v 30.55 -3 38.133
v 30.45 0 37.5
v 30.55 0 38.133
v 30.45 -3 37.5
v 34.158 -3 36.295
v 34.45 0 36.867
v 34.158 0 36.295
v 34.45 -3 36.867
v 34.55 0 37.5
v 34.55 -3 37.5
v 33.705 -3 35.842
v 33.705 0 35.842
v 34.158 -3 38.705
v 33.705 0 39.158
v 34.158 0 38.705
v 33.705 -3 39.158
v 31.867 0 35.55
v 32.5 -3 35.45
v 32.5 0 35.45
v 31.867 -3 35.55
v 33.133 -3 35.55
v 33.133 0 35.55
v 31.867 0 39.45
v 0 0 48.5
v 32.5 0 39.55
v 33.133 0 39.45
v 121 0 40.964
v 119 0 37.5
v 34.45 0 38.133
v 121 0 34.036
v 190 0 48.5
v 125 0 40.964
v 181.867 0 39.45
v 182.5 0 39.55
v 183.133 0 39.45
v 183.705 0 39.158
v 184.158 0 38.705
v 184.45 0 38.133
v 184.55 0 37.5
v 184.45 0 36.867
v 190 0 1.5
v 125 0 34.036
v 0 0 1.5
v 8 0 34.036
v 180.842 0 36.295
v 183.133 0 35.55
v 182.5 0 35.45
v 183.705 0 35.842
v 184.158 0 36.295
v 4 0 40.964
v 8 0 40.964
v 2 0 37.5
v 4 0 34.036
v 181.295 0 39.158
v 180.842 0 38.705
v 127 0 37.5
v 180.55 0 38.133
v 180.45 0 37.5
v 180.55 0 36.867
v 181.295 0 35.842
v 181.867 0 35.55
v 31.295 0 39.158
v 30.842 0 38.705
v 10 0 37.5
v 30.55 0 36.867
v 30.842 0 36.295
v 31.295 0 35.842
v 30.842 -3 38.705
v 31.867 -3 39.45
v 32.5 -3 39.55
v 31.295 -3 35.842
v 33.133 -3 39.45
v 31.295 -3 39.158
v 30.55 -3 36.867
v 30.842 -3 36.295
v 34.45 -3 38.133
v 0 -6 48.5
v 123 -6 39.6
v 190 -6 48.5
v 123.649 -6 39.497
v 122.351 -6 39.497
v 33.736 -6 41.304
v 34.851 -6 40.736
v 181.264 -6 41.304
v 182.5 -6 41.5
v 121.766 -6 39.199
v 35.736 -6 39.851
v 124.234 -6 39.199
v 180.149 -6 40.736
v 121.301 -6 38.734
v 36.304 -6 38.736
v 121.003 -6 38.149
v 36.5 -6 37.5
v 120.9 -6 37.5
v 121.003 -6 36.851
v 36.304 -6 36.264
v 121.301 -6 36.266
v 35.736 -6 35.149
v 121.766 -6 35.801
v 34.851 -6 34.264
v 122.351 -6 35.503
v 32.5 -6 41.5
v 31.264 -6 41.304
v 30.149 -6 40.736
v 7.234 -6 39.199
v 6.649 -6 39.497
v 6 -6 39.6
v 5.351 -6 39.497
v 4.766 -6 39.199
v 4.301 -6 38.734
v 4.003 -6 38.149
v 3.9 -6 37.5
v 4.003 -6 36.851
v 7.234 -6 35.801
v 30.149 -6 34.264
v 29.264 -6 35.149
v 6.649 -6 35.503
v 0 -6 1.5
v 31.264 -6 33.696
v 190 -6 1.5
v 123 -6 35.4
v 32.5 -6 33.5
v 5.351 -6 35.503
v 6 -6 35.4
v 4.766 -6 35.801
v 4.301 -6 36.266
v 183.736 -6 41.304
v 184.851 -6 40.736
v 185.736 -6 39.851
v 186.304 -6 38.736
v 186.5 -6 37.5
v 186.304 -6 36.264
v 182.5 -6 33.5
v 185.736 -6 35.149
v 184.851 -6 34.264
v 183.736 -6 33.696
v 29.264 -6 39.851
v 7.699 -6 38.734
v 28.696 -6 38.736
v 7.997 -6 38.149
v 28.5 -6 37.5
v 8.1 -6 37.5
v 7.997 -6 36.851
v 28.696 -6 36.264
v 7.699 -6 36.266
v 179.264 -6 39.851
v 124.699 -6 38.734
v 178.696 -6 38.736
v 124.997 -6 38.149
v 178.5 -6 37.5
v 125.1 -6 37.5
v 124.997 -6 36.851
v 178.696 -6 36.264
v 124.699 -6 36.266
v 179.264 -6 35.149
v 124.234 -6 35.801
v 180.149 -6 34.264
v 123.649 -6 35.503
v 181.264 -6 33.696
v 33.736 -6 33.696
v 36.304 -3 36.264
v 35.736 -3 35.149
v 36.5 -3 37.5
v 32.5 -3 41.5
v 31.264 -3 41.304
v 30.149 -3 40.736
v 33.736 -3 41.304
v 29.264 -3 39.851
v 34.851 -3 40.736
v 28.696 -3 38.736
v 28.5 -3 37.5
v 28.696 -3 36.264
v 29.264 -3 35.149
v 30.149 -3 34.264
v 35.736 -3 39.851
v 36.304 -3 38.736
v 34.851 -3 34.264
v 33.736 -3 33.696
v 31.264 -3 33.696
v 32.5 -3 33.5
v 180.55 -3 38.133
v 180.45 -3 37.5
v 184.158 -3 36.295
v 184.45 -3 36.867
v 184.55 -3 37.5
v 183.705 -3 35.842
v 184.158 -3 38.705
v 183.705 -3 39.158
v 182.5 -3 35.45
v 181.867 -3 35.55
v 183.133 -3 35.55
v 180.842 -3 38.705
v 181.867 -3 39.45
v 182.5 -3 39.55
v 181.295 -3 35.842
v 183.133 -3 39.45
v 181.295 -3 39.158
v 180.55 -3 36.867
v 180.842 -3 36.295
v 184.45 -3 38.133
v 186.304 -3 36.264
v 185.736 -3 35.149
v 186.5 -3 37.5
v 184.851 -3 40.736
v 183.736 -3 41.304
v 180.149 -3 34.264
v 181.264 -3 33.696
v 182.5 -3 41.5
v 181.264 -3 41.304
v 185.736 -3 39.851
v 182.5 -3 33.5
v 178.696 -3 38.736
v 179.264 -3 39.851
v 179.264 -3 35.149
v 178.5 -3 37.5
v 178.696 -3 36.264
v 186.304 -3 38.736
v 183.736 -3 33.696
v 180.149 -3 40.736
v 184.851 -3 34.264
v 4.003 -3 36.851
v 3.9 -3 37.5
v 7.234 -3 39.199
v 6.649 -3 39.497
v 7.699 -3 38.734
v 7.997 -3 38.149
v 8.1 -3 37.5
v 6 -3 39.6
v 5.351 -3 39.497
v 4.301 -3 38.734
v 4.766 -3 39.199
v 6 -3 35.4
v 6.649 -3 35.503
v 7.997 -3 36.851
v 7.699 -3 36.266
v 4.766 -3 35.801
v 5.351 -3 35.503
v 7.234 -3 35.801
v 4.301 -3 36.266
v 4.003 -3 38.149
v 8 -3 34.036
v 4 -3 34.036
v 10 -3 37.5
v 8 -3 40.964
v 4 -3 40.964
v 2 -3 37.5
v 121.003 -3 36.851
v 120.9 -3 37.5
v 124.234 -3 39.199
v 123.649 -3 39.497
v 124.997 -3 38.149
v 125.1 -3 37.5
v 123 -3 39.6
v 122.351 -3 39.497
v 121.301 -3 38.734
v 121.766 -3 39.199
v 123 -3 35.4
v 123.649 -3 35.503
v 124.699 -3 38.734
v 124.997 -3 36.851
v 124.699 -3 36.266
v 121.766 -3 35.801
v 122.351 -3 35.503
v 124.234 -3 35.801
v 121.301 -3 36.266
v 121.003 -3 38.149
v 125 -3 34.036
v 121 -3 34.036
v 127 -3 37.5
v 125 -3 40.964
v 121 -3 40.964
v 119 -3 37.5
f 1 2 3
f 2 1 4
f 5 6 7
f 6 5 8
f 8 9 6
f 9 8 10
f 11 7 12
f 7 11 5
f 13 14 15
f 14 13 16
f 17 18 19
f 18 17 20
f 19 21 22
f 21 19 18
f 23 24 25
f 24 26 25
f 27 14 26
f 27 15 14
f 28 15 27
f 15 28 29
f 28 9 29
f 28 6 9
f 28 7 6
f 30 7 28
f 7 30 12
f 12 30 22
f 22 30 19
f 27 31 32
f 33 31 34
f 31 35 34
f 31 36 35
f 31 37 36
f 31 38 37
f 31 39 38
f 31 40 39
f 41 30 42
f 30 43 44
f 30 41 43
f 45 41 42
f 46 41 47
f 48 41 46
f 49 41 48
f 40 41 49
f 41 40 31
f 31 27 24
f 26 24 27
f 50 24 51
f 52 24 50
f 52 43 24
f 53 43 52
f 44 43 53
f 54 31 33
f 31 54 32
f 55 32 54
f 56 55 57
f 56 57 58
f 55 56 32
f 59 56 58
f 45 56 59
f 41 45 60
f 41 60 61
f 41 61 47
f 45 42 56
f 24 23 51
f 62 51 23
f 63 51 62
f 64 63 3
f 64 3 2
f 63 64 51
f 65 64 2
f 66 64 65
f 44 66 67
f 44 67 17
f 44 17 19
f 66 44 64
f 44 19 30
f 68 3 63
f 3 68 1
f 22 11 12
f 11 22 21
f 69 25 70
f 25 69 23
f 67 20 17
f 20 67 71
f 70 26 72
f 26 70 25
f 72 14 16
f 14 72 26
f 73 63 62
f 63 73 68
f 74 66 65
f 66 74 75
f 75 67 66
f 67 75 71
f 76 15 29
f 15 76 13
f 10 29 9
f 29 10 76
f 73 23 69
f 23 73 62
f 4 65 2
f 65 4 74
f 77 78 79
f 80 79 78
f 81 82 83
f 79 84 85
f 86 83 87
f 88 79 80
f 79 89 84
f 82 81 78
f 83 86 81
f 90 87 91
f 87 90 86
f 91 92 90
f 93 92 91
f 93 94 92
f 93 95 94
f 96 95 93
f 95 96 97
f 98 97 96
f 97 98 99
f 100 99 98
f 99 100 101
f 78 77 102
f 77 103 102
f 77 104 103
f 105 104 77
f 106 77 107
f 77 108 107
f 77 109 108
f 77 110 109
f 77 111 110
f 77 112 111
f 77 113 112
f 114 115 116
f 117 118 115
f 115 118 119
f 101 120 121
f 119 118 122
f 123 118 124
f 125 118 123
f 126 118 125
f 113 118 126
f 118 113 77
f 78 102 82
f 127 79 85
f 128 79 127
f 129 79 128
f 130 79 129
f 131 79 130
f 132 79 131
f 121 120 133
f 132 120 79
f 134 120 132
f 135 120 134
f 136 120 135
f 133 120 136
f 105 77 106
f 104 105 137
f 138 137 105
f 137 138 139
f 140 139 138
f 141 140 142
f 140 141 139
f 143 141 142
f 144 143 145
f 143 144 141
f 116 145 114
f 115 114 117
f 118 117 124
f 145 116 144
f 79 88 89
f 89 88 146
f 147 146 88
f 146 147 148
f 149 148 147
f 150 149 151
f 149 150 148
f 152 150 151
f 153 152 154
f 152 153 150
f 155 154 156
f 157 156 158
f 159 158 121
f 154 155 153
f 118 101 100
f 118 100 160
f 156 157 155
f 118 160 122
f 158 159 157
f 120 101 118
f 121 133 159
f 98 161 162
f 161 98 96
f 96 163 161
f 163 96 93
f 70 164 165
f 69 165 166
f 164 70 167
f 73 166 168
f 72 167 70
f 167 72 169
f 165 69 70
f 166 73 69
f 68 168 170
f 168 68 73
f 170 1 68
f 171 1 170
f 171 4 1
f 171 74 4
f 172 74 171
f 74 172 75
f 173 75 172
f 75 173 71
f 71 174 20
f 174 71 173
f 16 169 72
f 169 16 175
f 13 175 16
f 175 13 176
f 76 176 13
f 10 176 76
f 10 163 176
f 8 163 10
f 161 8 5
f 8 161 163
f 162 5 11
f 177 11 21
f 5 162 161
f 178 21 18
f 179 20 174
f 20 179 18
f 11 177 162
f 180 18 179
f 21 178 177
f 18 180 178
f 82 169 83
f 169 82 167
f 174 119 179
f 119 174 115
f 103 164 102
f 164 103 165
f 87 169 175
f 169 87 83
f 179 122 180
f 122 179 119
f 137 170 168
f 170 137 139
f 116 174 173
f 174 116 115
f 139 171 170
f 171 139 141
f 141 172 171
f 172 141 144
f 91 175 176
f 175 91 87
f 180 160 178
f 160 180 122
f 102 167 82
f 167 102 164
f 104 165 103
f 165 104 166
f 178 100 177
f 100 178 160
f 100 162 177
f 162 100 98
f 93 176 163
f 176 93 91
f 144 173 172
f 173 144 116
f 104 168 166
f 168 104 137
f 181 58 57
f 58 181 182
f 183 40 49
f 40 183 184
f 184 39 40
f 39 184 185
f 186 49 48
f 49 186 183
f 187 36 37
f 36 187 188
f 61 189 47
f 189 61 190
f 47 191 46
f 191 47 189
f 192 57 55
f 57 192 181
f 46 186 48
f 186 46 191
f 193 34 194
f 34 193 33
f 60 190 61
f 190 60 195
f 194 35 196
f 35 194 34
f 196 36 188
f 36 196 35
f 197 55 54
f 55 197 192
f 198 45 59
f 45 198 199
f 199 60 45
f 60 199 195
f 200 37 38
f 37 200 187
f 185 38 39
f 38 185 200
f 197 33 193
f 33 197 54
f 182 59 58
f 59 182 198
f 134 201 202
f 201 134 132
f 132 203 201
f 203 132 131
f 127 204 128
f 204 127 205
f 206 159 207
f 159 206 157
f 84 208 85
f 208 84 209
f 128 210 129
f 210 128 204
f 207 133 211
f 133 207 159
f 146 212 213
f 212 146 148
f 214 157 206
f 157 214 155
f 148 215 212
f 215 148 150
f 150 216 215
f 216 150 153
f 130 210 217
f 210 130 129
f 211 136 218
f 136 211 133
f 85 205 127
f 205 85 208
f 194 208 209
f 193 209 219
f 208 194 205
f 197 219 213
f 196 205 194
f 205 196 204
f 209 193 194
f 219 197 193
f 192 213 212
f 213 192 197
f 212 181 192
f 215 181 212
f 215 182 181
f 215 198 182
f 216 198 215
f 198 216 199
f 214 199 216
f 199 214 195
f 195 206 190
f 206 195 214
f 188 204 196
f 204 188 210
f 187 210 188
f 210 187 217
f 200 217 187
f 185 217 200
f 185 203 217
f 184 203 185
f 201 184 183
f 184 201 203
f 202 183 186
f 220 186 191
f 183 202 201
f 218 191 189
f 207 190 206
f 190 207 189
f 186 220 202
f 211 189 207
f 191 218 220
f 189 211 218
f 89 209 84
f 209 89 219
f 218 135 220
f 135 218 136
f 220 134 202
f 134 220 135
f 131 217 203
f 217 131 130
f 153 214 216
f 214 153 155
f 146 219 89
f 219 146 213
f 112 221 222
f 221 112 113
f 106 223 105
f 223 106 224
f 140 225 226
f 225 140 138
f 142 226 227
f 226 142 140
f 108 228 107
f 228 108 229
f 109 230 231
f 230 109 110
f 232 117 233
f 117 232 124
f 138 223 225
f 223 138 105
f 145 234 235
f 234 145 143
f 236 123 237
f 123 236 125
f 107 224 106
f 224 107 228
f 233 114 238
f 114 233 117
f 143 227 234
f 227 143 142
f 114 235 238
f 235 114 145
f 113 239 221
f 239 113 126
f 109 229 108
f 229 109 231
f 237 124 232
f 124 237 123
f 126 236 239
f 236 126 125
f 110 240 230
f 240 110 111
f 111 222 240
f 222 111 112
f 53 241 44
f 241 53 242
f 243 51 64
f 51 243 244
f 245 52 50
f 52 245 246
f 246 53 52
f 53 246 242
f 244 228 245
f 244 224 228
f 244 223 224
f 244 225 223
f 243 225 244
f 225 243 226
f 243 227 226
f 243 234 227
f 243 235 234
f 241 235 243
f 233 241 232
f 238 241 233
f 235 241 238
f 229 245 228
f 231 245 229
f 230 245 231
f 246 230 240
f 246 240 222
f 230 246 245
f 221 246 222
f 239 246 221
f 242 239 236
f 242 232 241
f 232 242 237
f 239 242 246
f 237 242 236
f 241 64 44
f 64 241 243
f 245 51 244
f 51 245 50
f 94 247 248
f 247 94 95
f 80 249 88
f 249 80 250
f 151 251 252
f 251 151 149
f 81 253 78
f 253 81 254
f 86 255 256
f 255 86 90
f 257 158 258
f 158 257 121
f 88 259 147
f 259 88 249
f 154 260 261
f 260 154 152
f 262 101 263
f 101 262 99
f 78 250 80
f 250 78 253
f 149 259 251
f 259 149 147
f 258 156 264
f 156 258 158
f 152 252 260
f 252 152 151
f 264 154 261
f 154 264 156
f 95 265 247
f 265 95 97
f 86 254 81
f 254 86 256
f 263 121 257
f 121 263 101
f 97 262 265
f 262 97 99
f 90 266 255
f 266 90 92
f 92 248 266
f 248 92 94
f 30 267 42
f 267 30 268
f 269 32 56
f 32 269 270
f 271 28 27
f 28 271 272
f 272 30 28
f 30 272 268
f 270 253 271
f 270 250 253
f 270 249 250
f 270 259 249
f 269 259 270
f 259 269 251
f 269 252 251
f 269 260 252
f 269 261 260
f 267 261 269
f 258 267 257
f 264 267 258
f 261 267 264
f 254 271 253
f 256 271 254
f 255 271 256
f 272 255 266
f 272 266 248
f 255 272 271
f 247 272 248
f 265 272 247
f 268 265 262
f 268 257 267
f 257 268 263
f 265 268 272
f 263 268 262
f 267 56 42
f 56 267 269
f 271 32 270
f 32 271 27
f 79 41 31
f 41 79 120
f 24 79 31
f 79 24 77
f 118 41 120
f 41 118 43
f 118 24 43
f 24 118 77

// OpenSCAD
// select to create the psu_base or the bottom plate

//create_base = true;
//create_bottom_plate = false;
//create_shim = false;

//create_base = false;
//create_bottom_plate = true;
//create_shim = false;

create_base = false;
create_bottom_plate = false;
create_shim = true;



// todo:
//   - fix outer wall sizes (done)
//   - add base plate (done)

//   - add psu attach holes (done)
//   - add buttresses (done)
//   - add inside ledge (done)
//
//   - add rail attach
//   - bevel corners
//   - bolt_reinforcements

//   - add base plate attach tabs
//   - add base plate attach holes

// curve fineness
$fn = 20;

//**********
// orientation reference:
//   bottom: side of PSU towards table (-x)
//   frameside: side of PSU towards mk3 frame (-y)
//   back: side of PSU away from frame (+y)
//   inside: side of PSU towards rails and Einsy (+z)
//   outside: side of PSU with switch/plug

//  The origin is defined as the bottom/outside/frameside corner of the PSU body
//    +X is up (away from the table with PSU mounted on mk3)
//    +Y is back (away from the frame)
//    +Z is inside (towards the Einsy)

// measured constants are all in mm units


//**********
// meanwell NES-350-24 measurements
psu_length = 215;
psu_width = 115;
psu_height = 50;

// inside face 4mm tapped holes, 32.5 from bottom and frame/back corner
psu_inside_hole_vertical = 32.5;
psu_inside_hole_edge     = 32.5;

// frame face 4mm tapped holes, 2 near inside corner
psu_frame_hole_edge = 12.5;
psu_frame_hole1_x = 32.5;
psu_frame_hole2_x = 182.5;

// back face 4mm tapped holes, 4
psu_back_hole_edge = 12.5;
psu_back_hole1_x = 32.5;
psu_back_hole2_x = 182.5;


// prusa y hole positions.  x relative to top of rail, z relative to center of rail
y_hole1_x = 56;
y_hole2_x = y_hole1_x + 117;

y_hole_z = psu_height - 12.5;


// bottom_plate

bp_edge_t = 2;

ra_width = 33;
ra_depth = 17;
ra_f_chamfer = 5;
ra_r_chamfer = 3;
ra_t = bp_edge_t + 3;

//**********
// desired hole size for through 3mm bolt (not tapped)
hole_3mm_bolt = 3.1;
hole_3mm_bolt_r = hole_3mm_bolt/2;

// desired hole size for through 3mm bolt (tapped)
hole_3mm_bolt_tapped = 3;
hole_3mm_bolt_tapped_r = hole_3mm_bolt_tapped/2;

// desired hole size for through 4mm bolt (not tapped)
hole_4mm_bolt = 4.1;
hole_4mm_bolt_r = hole_4mm_bolt/2;





// general size of base
base_psu_overlap = 50;
base_height = 100;

side_wall_t   = 2.5;
back_wall_t   = 4;
frame_wall_t  = 6;

// buttress
buttress_t = 3;
buttress_w = 14;
buttress_h = base_height;

buttress_top_chamfer = 5;
buttress_bottom_chamfer = bp_edge_t;


//********************
// measured from Prusa PSU base
//********************

//**********
// wire exit (two half circles connected by rectangle, for wires to Einsy)
//   diameter of end circles
wire_exit_d = 6.5;
//   distance between centers of end circles
wire_exit_width = 10;
//   distance from the frame side of the PSU to the center of the opening
//wire_exit_front_offset = 20;  //prusa version is 20, shifting forward to avoid buttress conflict
wire_exit_front_offset = 17;

//**********
// slot for mains supply plug, flush to bottom of 
//   width/height
plug_slot_width = 27.25;
plug_slot_height = 32;
//   distance back edge of slot to back
plug_slot_back_offset = 20;

//   bottom plate thickness (offset of bottom of assembly to slot)
plug_slot_bottom_offset = bp_edge_t;

//   distance from edge of slot to center of bolt holes
plug_screw_offset_h = 5;
//   distance from bottom of base to bolt holes
plug_screw_offset_v = 16.5;

//**********
// rectangular hole for power switch

//   height/width
switch_height = 20;
switch_width = 12.5;

//   distance from frame side of base to edge of hole
switch_frame_offset = 8.5;
//   distance from bottom of base to edge of hole
switch_bottom_offset = 3 + bp_edge_t;

//**********
//**********

// outside/frame/bottom corner of whole base assembly (including bottom plate)

base_outer_position = [   -(base_height - base_psu_overlap),
                          -frame_wall_t,
                          -side_wall_t ];

base_outer_size =     [ base_height,
                        psu_width + frame_wall_t + back_wall_t,
                        psu_height + 2*side_wall_t ];

switch_hole_size     = [switch_height,switch_width, side_wall_t];
switch_hole_position = base_outer_position + 
                       [  switch_bottom_offset,
                          switch_frame_offset,
                          0 ];

plug_slot_size     = [plug_slot_height, plug_slot_width, side_wall_t];
plug_slot_position = base_outer_position + 
                     [  plug_slot_bottom_offset,
                        base_outer_size[1]-plug_slot_back_offset-plug_slot_width,
                        0  ];




wire_exit_center = base_outer_position + 
                   [  wire_exit_d/2 + bp_edge_t,
                      wire_exit_front_offset+wire_exit_width/2,
                      base_outer_size[2]-side_wall_t/2  ];

ledge_width = 3;  
ledge_height = 8;



// slot for frame side shim

shim_base_depth = 50;
shim_base_edge  = 4;

shim_width = base_outer_size[2] - 2*shim_base_edge;
shim_thickness = 6;
shim_height = 190;





//**************
//* draw base

if(create_base && create_bottom_plate && create_shim){
  psu_base(create_base, create_bottom_plate);

  shim();

} else if (create_base) {
  difference(){
    psu_base(create_base, create_bottom_plate);
    base_plate_container();
  }
} else if (create_bottom_plate) {
  intersection(){
    psu_base(create_base, create_bottom_plate);
    base_plate_container();
  }
} else {

  shim();


}


//*****************
//* module
//*****************


// main(){

module psu_base(base, bottom_plate){

  // build the outer shell, then knock all the holes in it
  difference(){

    union(){
      // main shell
      outer_shell();
      buttresses();
      plug_hole_reinforce();
      psu_ledge();
      rail_attach();

      back_bump();  // thicker space to slide above back frame

      base_plate_tabs();

    }


    base_plate_tabs(holes = true);

    frame_side_opening();
    plug_hole();
    switch_hole();
    wire_exit();
    bottom_plate_screws();
    psu_base_screws();
    back_lift();  // thicker space to slide above back frame
  }


}




module psu_block(){
    cube([psu_length, psu_width, psu_height]);
}

module outer_shell(){
    difference()
    {
      translate(base_outer_position) cube(base_outer_size);
      // cut out a psu_block width/height hole
      psu_block();
      wire_space();
    }
}

module buttresses(){
  // inside edge, thicker portions around/under inside PSU attach screws
  // full height of base (including bottom plate)
  // chamfered at top/bottom

  //**
  // base positions for buttresses
  position1 = base_outer_position + [base_height/2,psu_inside_hole_edge+frame_wall_t,base_outer_size[2] + buttress_t/2];
  position2 = base_outer_position + [base_height/2,base_outer_size[1] - psu_inside_hole_edge-back_wall_t,base_outer_size[2] + buttress_t/2];

  //**
  // top chamfer (5mm)
   
  // triangle origin, top of buttress where it meets the base wall
  pt1 = [0,0]; 
  pt2 = [pt1[1], pt1[0] + buttress_t];
  pt3 = [pt1[1] - buttress_top_chamfer, pt1[0] + buttress_t];
  top_chamfer_pos = base_outer_position + base_outer_size;

  //**
  // bottom chamfer
  // triangle origin, top of buttress where it meets the base wall
  pt4 = [0,0]; 
  pt5 = [pt1[1], pt1[0] + buttress_t];
  pt6 = [pt1[1] + buttress_bottom_chamfer, pt1[0] + buttress_t];
  bottom_chamfer_pos = base_outer_position + [0,base_outer_size[1],base_outer_size[2]];

  


  difference(){
    union(){ 
      translate(position1) cube([buttress_h,buttress_w,buttress_t], center = true);
      translate(position2) cube([buttress_h,buttress_w,buttress_t], center = true);
    }
  
    translate(top_chamfer_pos)     rotate([90,0,0]) linear_extrude(height = base_outer_size[1]) polygon(points = [pt1,pt2,pt3]);
    translate(bottom_chamfer_pos)  rotate([90,0,0]) linear_extrude(height = base_outer_size[1]) polygon(points = [pt4,pt5,pt6]);
  }
}

module psu_ledge(){
  // 5mm ledge for PSU to rest on in base
  // full width of back wall
  // short segment on inside/outside wall

  chamfer_height = 8;

  short_ledge_extent = 20;
  short_ledge_frame_offset = 25;

  ledge_pts = [[0,0], 
               [ledge_height,0], 
               [ledge_height,ledge_width], 
               [-chamfer_height,ledge_width]];
  
  ledge1_pos = [-ledge_height,psu_width - ledge_width,0];
  translate(ledge1_pos) linear_extrude(height = psu_height) polygon(points = ledge_pts);

  ledge2_pos = [-ledge_height,short_ledge_frame_offset,ledge_width];
  translate(ledge2_pos) rotate([-90,0,0]) linear_extrude(height = short_ledge_extent) polygon(points = ledge_pts);  

  ledge3_pos = [-ledge_height,short_ledge_frame_offset + short_ledge_extent,psu_height - ledge_width];
  translate(ledge3_pos) rotate([90,0,0]) linear_extrude(height = short_ledge_extent) polygon(points = ledge_pts);  

}

module rail_attach(){

  sp_bot_flat = 2;
  sp_top_flat = 4.5;
  sp_height = 17 + bp_edge_t;
  sp_t = 5;
 
  hole_spacing = 20;
  hole_d = 3.2;
  hole_l = 6;
  hole_base_distance = 10;

  //** base
  base_poly = [ [0, 0],
                [0, ra_depth - ra_f_chamfer],
                [ra_f_chamfer, ra_depth],
                [ra_width - ra_r_chamfer, ra_depth],
                [ra_width, ra_depth-ra_r_chamfer],
                [ra_width, 0]];

  ra_pos = [base_outer_position[0],
            base_outer_position[1] + base_outer_size[1] - back_wall_t - psu_inside_hole_edge - ra_width/2 - buttress_w/2 - sp_t/2,
            base_outer_position[2] + base_outer_size[2]];


  //** angle support
  support_poly = [ [0,                  0],
		   [0,                  -ra_depth],
		   [sp_bot_flat + ra_t, -ra_depth],
		   [sp_height,          -sp_top_flat],
		   [sp_height,          0]];

//  sp_pos = [base_outer_position[0],
//            base_outer_position[1] + base_outer_size[1] - back_wall_t - psu_inside_hole_edge + buttress_w/2,
//            base_outer_position[2] + base_outer_size[2]];

  sp_pos = ra_pos + [0,ra_width/2 - sp_t/2,0 ];

  // holes

  h_pos1 = ra_pos + [ra_t/2,ra_width/2+hole_spacing/2,hole_base_distance];
  h_pos2 = ra_pos + [ra_t/2,ra_width/2-hole_spacing/2,hole_base_distance];


  difference(){
    union() {
      translate(ra_pos) rotate([90,0,90]) linear_extrude(height=ra_t) polygon(points = base_poly);
      translate(sp_pos) rotate([-90,0,0]) linear_extrude(height=sp_t) polygon(points = support_poly);
    }
    translate(h_pos1) rotate([0,90,0]) ra_slot(hole_d/2, 2.5, ra_t);
    translate(h_pos2) rotate([0,90,0]) ra_slot(hole_d/2, 2.5, ra_t);
  }
}

module ra_slot(radius, circle_d, depth){
  translate([circle_d/2,0,0])  cylinder(h = depth*1.1, r=radius, center = true);
  translate([-circle_d/2,0,0]) cylinder(h = depth*1.1, r=radius, center = true);
  translate([0,0,0]) cube([circle_d, 2*radius, depth*1.1], center = true);
}


module back_bump(){
  // solid lip in back of base, lid won't go there
  //  provides 2mm clearance for rear frame piece of i3

  bump_y = ledge_width + back_wall_t;
  bump_x = 25;
  bump_z = base_outer_size[2];

  bump_pos = [base_outer_position[0],
              base_outer_position[1] + base_outer_size[1] - bump_y, 
              base_outer_position[2] + base_outer_size[2] - bump_z];

  translate(bump_pos) cube([bump_x,bump_y,bump_z]);
}

module back_lift(){
  // gap in bottom of back for frame

  lift_x = bp_edge_t;
  lift_y = ledge_width + back_wall_t - 1.2;
  lift_z = base_outer_size[2];

  lift_pos = [base_outer_position[0],
              base_outer_position[1] + base_outer_size[1] - lift_y, 
              base_outer_position[2] + base_outer_size[2] - lift_z];

  translate(lift_pos) cube([lift_x,lift_y,lift_z]);
}


module wire_space(){
    translate(base_outer_position + [bp_edge_t,frame_wall_t, side_wall_t])
      cube( [ base_height - base_psu_overlap - bp_edge_t, 
              base_outer_size[1] - frame_wall_t - back_wall_t,
              base_outer_size[2] - 2*side_wall_t]);
}

module plug_hole(){

  translate(plug_slot_position) cube(plug_slot_size);

  // screw positions relative to plug slot position
  screw1_position = [plug_screw_offset_v,-plug_screw_offset_h,0];
  screw2_position = [plug_screw_offset_v, plug_screw_offset_h + plug_slot_width,0];
    
  translate(plug_slot_position + screw1_position) bolt_hole_3mm(side_wall_t);
  translate(plug_slot_position + screw2_position) bolt_hole_3mm(side_wall_t);
  
}

module plug_hole_reinforce(positive = true){

  lock_nut_width_cc = 6;
  lock_nut_slot_height = 2;

  ph_re_width  = 9;
  ph_re_length = 9;

  // screw positions relative to plug slot position
  ph_reinforce_1 = plug_slot_position + [plug_screw_offset_v,-plug_screw_offset_h,0] + [0,0,side_wall_t];
  ph_reinforce_2 = plug_slot_position + [plug_screw_offset_v, plug_screw_offset_h + plug_slot_width,0]  + [0,0,side_wall_t];

  translate(ph_reinforce_1) ph_reinforce();
  translate(ph_reinforce_2) ph_reinforce();

  module ph_reinforce(){
    difference(){
      translate([0,-ph_re_width/2,0]) cube([ph_re_length, ph_re_width, lock_nut_slot_height]);
      linear_extrude(height = lock_nut_slot_height) circle(lock_nut_width_cc/2, $fn = 6);
    }
  }
}


module switch_hole(){
  translate(switch_hole_position) cube(switch_hole_size);
}

module wire_exit(){
  translate(wire_exit_center) wire_exit_shape();
}

module wire_exit_shape(){
  cube([wire_exit_d, wire_exit_width, side_wall_t], center = true);
  translate([0,wire_exit_width/2,0]) cylinder(h=side_wall_t, r=wire_exit_d/2, center=true);
  translate([0,-wire_exit_width/2,0]) cylinder(h=side_wall_t, r=wire_exit_d/2, center=true);
}

module bottom_plate_screws(){
}

module psu_base_screws(){

  // inside face bolt holes, extend through buttresses then side wall

  position1 = [psu_inside_hole_vertical, psu_inside_hole_edge,             psu_height + side_wall_t + buttress_t];  // outside of buttress
  position2 = [psu_inside_hole_vertical, psu_width - psu_inside_hole_edge, psu_height + side_wall_t + buttress_t];  // outside of buttress

  translate(position1) rotate([0,180,0]) bolt_hole_4mm(side_wall_t + buttress_t, c = false);
  translate(position2) rotate([0,180,0]) bolt_hole_4mm(side_wall_t + buttress_t, c = false);

  // back holes
  position3 = [psu_back_hole1_x, psu_width + back_wall_t, psu_back_hole_edge];
  position4 = [psu_back_hole1_x, psu_width + back_wall_t, psu_height - psu_back_hole_edge];
  translate(position3) rotate([90,0,0]) bolt_hole_4mm(back_wall_t, c = false);
  translate(position4) rotate([90,0,0]) bolt_hole_4mm(back_wall_t, c = false);




}

module frame_side_opening(){
  depth = shim_base_depth;
  edge  = shim_base_edge;
  slot_size = [depth, frame_wall_t, base_outer_size[2] - 2*edge];
  slot_pos = [base_psu_overlap-depth, -frame_wall_t, edge - side_wall_t];
  translate(slot_pos) cube(slot_size);
}


module base_plate_tabs(holes = false){

  tab_outside_pos = [base_outer_position[0],40,-side_wall_t ];
  tab_outside_rot = [0,0,0];

  tab_inside_pos = [base_outer_position[0],50,base_outer_position[2] + base_outer_size[2] ];
  tab_inside_rot = [180,0,0];

  tab_back_pos = [base_outer_position[0],
                  base_outer_position[1] + base_outer_size[1] - ledge_width,
                  base_outer_position[2] + base_outer_size[2]/2 ];
  tab_back_rot = [90,0,0];

  tab_frame_pos = [base_outer_position[0],
                   base_outer_position[1],
                   base_outer_position[2] + base_outer_size[2]/2 ];
  tab_frame_rot = [-90,0,0];

  translate(tab_outside_pos) rotate(tab_outside_rot) side_plate_tab(holes);
  translate(tab_inside_pos)  rotate(tab_inside_rot)  side_plate_tab(holes);
  translate(tab_back_pos)    rotate(tab_back_rot)    side_plate_tab(holes, width=30);
  translate(tab_frame_pos)   rotate(tab_frame_rot)   side_plate_tab(holes, width=30);

}

module side_plate_tab(holes = false, width = 15){

  height = 13;
  depth  = 10;  // including side wall of 2.5, wall_thickening of 2.5, lid_tab of 5

  hole_height = 8;

  nut_width = 5.5;
  nut_t     = 1.7;

  slot_offset = depth * (3/4);
  

  points = [[0,0],
            [0,               width/2],
            [height * (3/4),  width/2],
            [height,          width/2 - height/4],
            [height,          -width/2 + height/4],
            [height * (3/4),  -width/2],
            [0,               -width/2]];

  if(!holes){
    linear_extrude(height = depth) polygon(points);
  } else {
    translate([hole_height,0,0]) bolt_hole_3mm(depth);
    translate([0,-nut_width/2,slot_offset-nut_t/2]) cube([hole_height + nut_width/2 + 1,nut_width,nut_t]);
  }

}

module end_plate_tab(holes = false){

  cube([10,10,10]);

}





module bolt_hole_3mm(depth, center = false){
  cylinder(h=depth, r=hole_3mm_bolt_r, centered = center);
}

module bolt_hole_3mm_tapped(depth, center = false){
  cylinder(h=depth, r=hole_3mm_bolt_tapped_r, centered = center);
}

module bolt_hole_4mm(depth, c = false){
  cylinder(h=depth, r=hole_4mm_bolt_r, center = c);
}

module base_plate_container(){

  side_offset = 2.5;
  internal_height = 13;

  // main flat bottom plate
  translate(base_outer_position) cube([bp_edge_t,base_outer_size[1],base_outer_size[2] + buttress_t + ra_depth]);

  // add lower center of internals to get part of tabs and thickened middle plate

  internal_plate_pos  = [base_outer_position[0], 0, side_offset];
  internal_plate_size = [internal_height,psu_width - ledge_width - 0.01, psu_height - 2*side_offset];

  translate(internal_plate_pos) cube(internal_plate_size);

}

//**********

module shim(){

  shim_pos = [base_psu_overlap-shim_base_depth, -shim_thickness, (base_outer_size[2] - shim_width)/2-side_wall_t];
  shim_size = [shim_height, shim_thickness, shim_width];

  psu_hole1_pos = [ psu_frame_hole1_x, -shim_thickness, psu_height - psu_frame_hole_edge];
  psu_hole2_pos = [ psu_frame_hole2_x, -shim_thickness, psu_height - psu_frame_hole_edge];

  frame_hole1_pos = [base_outer_position[0] + y_hole1_x, 0, y_hole_z];
  frame_hole2_pos = [base_outer_position[0] + y_hole2_x, 0, y_hole_z];

  frame_hole1_rot = [90,0,0];
  frame_hole2_rot = [90,0,0];
  
  difference(){
    translate(shim_pos) cube(shim_size);

    psu_bolt_hole(psu_hole1_pos);
    psu_bolt_hole(psu_hole2_pos);

    shim_hole_with_nut(frame_hole1_pos,frame_hole1_rot);
    shim_hole_with_nut(frame_hole2_pos,frame_hole2_rot);
  }
}

module shim_hole_with_nut(pos,rot){

  translate(pos) rotate(rot) cylinder(r=2.1,h=shim_thickness);

  translate(pos) rotate(rot) cylinder(r=4,h=3, $fn=6);

}

module psu_bolt_hole(pos){

  head_d = 8;
  head_t = 3;
    
  translate(pos) rotate([-90,0,0]) bolt_hole_4mm(shim_thickness);
  translate(pos) rotate([-90,0,0]) cylinder(h=head_t,r=head_d/2,$fn=20);

}
